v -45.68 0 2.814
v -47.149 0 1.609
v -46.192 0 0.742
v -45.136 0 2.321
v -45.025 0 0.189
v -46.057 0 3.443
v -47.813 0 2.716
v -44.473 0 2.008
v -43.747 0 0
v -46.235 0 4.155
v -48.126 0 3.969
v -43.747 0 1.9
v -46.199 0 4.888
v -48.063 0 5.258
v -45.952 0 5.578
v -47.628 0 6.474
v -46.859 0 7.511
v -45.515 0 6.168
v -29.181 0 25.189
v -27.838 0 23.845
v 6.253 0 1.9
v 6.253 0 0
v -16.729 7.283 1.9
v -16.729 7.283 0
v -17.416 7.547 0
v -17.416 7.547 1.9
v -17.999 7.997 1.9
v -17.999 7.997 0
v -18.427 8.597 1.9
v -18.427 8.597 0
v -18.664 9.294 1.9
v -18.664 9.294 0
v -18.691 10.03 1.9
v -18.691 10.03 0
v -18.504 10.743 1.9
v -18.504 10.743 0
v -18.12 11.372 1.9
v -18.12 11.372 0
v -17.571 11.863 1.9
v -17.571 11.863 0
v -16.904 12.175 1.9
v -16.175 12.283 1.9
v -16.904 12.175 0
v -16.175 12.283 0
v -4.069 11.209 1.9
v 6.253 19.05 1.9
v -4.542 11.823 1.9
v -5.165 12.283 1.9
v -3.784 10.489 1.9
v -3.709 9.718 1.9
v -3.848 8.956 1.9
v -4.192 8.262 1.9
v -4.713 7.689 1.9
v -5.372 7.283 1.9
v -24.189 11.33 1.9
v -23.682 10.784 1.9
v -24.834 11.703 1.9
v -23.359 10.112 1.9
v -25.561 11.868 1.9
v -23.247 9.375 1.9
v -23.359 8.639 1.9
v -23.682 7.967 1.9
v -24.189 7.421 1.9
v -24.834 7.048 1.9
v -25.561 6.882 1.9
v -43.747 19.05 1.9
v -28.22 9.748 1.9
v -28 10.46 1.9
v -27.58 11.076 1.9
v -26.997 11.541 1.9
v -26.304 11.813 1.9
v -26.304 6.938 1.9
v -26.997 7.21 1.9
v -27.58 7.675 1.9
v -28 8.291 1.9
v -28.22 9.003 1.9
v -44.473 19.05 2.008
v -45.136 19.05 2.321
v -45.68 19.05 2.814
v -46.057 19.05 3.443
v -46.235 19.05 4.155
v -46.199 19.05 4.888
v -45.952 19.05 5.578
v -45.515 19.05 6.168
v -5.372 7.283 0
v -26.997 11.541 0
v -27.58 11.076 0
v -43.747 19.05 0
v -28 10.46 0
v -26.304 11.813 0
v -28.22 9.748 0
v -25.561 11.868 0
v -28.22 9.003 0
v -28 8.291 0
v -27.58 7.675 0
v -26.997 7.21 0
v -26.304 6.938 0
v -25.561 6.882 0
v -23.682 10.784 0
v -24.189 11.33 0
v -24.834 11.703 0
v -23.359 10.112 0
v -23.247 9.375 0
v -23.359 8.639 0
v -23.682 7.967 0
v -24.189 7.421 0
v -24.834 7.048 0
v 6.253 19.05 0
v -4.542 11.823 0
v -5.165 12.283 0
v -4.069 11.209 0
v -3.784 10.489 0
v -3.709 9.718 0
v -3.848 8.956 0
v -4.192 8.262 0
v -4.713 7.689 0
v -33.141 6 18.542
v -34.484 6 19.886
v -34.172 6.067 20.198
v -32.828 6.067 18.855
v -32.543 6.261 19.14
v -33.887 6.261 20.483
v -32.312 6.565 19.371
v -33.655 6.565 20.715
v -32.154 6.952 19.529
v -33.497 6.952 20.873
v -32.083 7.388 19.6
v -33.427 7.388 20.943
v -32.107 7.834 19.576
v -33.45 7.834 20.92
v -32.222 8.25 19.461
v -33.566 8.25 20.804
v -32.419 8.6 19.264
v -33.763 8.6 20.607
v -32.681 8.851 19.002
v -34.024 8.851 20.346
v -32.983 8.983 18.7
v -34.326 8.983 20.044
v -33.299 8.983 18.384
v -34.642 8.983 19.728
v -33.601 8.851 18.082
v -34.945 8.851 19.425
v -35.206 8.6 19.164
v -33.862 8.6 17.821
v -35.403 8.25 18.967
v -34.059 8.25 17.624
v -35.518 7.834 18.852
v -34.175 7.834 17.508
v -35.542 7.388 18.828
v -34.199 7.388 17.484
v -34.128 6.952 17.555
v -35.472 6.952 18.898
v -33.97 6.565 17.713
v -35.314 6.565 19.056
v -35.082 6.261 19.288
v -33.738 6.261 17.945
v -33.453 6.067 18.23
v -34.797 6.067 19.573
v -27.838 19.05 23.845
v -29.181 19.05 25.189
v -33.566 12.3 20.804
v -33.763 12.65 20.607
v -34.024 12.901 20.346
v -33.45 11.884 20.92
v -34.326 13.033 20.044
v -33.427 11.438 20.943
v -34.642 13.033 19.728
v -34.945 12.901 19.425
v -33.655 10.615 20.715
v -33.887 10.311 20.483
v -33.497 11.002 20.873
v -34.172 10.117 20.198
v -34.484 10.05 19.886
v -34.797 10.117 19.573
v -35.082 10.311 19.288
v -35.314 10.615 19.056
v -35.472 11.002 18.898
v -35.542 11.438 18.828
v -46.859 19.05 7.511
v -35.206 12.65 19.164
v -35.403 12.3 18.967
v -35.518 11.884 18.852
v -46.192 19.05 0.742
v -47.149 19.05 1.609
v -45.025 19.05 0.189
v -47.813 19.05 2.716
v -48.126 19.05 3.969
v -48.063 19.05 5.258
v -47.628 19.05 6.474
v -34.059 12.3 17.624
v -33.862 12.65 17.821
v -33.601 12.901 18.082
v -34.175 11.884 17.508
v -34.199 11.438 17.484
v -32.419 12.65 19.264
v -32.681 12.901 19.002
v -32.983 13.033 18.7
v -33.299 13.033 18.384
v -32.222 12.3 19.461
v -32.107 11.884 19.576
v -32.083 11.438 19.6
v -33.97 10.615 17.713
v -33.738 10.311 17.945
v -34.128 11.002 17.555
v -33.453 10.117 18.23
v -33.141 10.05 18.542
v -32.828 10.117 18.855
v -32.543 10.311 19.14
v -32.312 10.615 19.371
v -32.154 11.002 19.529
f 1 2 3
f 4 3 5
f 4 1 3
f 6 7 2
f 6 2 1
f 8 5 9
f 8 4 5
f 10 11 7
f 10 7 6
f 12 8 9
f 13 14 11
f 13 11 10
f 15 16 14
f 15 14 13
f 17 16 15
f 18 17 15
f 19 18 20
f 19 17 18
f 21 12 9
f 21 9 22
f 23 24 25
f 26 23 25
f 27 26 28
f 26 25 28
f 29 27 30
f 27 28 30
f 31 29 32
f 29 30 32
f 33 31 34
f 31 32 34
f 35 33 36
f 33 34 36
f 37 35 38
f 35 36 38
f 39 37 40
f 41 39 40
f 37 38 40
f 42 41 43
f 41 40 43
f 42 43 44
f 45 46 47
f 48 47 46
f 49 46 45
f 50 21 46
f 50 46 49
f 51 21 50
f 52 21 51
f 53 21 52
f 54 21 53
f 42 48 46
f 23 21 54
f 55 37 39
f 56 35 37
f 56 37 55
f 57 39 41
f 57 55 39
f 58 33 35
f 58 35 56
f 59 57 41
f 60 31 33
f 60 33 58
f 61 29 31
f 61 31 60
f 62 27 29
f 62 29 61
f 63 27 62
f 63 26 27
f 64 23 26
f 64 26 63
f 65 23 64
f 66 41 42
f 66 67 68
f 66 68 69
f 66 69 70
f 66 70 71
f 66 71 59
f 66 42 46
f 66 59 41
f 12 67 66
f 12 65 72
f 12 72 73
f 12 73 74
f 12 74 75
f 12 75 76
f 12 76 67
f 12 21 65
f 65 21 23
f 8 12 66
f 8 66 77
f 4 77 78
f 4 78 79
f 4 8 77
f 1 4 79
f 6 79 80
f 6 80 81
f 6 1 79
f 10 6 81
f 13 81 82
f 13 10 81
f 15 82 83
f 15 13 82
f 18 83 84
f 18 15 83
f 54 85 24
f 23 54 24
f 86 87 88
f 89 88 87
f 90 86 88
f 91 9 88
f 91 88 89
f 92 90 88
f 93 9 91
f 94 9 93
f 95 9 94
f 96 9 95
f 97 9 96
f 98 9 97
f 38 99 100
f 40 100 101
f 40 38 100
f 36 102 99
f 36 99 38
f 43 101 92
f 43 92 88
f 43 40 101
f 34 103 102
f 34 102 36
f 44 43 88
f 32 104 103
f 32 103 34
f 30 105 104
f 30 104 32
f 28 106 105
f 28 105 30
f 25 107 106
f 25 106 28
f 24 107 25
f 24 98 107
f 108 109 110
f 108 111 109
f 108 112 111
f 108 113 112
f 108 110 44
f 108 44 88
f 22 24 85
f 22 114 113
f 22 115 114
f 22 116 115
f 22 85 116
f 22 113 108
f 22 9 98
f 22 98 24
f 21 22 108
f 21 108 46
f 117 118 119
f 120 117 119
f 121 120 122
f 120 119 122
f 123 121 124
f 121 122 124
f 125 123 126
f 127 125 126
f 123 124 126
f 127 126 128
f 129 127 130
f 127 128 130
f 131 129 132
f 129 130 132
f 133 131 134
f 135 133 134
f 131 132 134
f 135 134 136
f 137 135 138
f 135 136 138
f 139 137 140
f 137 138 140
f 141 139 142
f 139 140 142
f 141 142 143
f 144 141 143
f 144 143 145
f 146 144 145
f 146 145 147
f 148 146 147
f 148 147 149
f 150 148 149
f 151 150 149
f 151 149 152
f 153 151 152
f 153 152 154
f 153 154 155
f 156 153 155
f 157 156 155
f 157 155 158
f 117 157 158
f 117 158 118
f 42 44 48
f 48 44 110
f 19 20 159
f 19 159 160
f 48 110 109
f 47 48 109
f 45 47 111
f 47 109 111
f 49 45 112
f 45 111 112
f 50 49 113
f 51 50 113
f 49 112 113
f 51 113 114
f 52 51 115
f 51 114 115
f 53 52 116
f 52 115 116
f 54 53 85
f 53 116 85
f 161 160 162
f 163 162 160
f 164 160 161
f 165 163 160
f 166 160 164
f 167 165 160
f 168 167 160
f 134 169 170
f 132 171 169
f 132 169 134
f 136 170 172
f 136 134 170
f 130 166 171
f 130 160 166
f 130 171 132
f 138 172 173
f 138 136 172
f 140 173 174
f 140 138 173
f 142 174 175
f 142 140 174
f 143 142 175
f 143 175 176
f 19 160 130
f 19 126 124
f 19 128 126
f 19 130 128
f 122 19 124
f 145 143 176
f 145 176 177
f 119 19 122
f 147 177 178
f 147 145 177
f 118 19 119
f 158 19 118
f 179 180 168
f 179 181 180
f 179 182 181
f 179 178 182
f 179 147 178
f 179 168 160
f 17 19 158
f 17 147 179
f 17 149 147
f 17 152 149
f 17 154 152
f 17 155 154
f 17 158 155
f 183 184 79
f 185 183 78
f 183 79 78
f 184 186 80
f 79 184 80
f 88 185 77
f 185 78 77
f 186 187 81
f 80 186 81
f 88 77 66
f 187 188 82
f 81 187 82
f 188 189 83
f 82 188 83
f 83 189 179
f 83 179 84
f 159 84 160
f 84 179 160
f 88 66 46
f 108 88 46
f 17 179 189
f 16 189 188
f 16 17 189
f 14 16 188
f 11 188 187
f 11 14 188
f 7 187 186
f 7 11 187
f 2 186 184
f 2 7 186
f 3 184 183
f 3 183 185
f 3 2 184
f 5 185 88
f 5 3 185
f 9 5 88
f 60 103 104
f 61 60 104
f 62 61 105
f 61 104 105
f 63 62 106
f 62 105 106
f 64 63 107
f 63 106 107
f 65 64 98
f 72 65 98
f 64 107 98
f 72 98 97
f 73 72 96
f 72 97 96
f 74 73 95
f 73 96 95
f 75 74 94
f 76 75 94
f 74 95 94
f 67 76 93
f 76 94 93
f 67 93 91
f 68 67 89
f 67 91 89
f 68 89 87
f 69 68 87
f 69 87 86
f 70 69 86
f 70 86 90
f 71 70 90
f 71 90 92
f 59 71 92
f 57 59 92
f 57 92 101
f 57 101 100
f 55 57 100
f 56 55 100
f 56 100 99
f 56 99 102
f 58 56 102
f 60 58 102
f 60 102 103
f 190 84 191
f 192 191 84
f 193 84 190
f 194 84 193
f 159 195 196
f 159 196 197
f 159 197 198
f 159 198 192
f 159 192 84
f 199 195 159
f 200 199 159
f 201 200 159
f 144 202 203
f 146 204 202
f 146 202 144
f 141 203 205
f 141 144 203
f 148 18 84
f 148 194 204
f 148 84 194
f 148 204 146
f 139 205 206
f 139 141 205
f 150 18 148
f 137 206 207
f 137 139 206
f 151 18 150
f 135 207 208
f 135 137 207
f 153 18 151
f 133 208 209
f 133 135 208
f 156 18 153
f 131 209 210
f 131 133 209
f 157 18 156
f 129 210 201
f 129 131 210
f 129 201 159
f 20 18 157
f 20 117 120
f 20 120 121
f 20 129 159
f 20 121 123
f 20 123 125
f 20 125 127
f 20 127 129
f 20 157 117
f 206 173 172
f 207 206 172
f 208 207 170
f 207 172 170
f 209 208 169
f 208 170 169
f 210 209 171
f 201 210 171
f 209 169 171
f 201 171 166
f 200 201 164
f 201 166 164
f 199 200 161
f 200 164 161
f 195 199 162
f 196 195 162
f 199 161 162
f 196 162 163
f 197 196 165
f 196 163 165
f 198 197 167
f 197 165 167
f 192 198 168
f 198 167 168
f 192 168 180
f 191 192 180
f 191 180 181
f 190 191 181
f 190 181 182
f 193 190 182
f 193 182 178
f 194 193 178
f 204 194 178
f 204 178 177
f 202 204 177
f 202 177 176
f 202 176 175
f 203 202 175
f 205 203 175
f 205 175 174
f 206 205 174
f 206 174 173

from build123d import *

# Parameters (mm, degrees)
F1_DEPTH = 19.05
F2_R     = 1.5
F3_DEPTH = 12.7
F4_R     = 2.5
F5_DEPTH = 12.7


with BuildPart() as f1:
    # F0 (on Front) → F1 (new body)
    with BuildSketch(Plane.XZ):
        with BuildLine():
            Line((-43.747465, 0), (6.252535, 0))
            Line((6.252535, 0), (6.252535, 1.900001))
            Line((6.252535, 1.900001), (-43.747465, 1.900001))
            ThreePointArc((-43.747465, 1.900001), (-46.057163, 3.443292), (-45.515231, 6.167766))
            Line((-45.515231, 6.167766), (-27.837562, 23.845436))
            Line((-27.837562, 23.845436), (-29.181065, 25.188939))
            Line((-29.181065, 25.188939), (-46.858735, 7.51127))
            ThreePointArc((-46.858735, 7.51127), (-47.812535, 2.716193), (-43.747465, 0))
        make_face()
    extrude(amount=-F1_DEPTH)

    # F2 (on face) → F3 (cut)
    with BuildSketch(Plane(origin=(-27.185002, 0, 27.185002), x_dir=(0, -1, 0), z_dir=(-0.707107, 0, 0.707107))):
        with Locations((-7.5, -10.322859)):
            Circle(F2_R)
        with Locations((-11.55, -10.322859)):
            Circle(F2_R)
    extrude(amount=-F3_DEPTH, mode=Mode.SUBTRACT)

    # F4 (on face) → F5 (cut)
    with BuildSketch(Plane(origin=(0, 0, 0), x_dir=(1, 0, 0), z_dir=(0, 0, -1))):
        with BuildLine():
            Line((-5.372359, -7.282656), (-16.72876, -7.282656))
            ThreePointArc((-16.72876, -7.282656), (-18.690573, -10.030443), (-16.175304, -12.282656))
            Line((-16.175304, -12.282656), (-5.164585, -12.282656))
            ThreePointArc((-5.164585, -12.282656), (-3.70868, -9.717839), (-5.372359, -7.282656))
        make_face()
        with Locations((-25.747465, -9.375455)):
            Circle(F4_R)
    extrude(amount=-F5_DEPTH, mode=Mode.SUBTRACT)


solid = f1.part
